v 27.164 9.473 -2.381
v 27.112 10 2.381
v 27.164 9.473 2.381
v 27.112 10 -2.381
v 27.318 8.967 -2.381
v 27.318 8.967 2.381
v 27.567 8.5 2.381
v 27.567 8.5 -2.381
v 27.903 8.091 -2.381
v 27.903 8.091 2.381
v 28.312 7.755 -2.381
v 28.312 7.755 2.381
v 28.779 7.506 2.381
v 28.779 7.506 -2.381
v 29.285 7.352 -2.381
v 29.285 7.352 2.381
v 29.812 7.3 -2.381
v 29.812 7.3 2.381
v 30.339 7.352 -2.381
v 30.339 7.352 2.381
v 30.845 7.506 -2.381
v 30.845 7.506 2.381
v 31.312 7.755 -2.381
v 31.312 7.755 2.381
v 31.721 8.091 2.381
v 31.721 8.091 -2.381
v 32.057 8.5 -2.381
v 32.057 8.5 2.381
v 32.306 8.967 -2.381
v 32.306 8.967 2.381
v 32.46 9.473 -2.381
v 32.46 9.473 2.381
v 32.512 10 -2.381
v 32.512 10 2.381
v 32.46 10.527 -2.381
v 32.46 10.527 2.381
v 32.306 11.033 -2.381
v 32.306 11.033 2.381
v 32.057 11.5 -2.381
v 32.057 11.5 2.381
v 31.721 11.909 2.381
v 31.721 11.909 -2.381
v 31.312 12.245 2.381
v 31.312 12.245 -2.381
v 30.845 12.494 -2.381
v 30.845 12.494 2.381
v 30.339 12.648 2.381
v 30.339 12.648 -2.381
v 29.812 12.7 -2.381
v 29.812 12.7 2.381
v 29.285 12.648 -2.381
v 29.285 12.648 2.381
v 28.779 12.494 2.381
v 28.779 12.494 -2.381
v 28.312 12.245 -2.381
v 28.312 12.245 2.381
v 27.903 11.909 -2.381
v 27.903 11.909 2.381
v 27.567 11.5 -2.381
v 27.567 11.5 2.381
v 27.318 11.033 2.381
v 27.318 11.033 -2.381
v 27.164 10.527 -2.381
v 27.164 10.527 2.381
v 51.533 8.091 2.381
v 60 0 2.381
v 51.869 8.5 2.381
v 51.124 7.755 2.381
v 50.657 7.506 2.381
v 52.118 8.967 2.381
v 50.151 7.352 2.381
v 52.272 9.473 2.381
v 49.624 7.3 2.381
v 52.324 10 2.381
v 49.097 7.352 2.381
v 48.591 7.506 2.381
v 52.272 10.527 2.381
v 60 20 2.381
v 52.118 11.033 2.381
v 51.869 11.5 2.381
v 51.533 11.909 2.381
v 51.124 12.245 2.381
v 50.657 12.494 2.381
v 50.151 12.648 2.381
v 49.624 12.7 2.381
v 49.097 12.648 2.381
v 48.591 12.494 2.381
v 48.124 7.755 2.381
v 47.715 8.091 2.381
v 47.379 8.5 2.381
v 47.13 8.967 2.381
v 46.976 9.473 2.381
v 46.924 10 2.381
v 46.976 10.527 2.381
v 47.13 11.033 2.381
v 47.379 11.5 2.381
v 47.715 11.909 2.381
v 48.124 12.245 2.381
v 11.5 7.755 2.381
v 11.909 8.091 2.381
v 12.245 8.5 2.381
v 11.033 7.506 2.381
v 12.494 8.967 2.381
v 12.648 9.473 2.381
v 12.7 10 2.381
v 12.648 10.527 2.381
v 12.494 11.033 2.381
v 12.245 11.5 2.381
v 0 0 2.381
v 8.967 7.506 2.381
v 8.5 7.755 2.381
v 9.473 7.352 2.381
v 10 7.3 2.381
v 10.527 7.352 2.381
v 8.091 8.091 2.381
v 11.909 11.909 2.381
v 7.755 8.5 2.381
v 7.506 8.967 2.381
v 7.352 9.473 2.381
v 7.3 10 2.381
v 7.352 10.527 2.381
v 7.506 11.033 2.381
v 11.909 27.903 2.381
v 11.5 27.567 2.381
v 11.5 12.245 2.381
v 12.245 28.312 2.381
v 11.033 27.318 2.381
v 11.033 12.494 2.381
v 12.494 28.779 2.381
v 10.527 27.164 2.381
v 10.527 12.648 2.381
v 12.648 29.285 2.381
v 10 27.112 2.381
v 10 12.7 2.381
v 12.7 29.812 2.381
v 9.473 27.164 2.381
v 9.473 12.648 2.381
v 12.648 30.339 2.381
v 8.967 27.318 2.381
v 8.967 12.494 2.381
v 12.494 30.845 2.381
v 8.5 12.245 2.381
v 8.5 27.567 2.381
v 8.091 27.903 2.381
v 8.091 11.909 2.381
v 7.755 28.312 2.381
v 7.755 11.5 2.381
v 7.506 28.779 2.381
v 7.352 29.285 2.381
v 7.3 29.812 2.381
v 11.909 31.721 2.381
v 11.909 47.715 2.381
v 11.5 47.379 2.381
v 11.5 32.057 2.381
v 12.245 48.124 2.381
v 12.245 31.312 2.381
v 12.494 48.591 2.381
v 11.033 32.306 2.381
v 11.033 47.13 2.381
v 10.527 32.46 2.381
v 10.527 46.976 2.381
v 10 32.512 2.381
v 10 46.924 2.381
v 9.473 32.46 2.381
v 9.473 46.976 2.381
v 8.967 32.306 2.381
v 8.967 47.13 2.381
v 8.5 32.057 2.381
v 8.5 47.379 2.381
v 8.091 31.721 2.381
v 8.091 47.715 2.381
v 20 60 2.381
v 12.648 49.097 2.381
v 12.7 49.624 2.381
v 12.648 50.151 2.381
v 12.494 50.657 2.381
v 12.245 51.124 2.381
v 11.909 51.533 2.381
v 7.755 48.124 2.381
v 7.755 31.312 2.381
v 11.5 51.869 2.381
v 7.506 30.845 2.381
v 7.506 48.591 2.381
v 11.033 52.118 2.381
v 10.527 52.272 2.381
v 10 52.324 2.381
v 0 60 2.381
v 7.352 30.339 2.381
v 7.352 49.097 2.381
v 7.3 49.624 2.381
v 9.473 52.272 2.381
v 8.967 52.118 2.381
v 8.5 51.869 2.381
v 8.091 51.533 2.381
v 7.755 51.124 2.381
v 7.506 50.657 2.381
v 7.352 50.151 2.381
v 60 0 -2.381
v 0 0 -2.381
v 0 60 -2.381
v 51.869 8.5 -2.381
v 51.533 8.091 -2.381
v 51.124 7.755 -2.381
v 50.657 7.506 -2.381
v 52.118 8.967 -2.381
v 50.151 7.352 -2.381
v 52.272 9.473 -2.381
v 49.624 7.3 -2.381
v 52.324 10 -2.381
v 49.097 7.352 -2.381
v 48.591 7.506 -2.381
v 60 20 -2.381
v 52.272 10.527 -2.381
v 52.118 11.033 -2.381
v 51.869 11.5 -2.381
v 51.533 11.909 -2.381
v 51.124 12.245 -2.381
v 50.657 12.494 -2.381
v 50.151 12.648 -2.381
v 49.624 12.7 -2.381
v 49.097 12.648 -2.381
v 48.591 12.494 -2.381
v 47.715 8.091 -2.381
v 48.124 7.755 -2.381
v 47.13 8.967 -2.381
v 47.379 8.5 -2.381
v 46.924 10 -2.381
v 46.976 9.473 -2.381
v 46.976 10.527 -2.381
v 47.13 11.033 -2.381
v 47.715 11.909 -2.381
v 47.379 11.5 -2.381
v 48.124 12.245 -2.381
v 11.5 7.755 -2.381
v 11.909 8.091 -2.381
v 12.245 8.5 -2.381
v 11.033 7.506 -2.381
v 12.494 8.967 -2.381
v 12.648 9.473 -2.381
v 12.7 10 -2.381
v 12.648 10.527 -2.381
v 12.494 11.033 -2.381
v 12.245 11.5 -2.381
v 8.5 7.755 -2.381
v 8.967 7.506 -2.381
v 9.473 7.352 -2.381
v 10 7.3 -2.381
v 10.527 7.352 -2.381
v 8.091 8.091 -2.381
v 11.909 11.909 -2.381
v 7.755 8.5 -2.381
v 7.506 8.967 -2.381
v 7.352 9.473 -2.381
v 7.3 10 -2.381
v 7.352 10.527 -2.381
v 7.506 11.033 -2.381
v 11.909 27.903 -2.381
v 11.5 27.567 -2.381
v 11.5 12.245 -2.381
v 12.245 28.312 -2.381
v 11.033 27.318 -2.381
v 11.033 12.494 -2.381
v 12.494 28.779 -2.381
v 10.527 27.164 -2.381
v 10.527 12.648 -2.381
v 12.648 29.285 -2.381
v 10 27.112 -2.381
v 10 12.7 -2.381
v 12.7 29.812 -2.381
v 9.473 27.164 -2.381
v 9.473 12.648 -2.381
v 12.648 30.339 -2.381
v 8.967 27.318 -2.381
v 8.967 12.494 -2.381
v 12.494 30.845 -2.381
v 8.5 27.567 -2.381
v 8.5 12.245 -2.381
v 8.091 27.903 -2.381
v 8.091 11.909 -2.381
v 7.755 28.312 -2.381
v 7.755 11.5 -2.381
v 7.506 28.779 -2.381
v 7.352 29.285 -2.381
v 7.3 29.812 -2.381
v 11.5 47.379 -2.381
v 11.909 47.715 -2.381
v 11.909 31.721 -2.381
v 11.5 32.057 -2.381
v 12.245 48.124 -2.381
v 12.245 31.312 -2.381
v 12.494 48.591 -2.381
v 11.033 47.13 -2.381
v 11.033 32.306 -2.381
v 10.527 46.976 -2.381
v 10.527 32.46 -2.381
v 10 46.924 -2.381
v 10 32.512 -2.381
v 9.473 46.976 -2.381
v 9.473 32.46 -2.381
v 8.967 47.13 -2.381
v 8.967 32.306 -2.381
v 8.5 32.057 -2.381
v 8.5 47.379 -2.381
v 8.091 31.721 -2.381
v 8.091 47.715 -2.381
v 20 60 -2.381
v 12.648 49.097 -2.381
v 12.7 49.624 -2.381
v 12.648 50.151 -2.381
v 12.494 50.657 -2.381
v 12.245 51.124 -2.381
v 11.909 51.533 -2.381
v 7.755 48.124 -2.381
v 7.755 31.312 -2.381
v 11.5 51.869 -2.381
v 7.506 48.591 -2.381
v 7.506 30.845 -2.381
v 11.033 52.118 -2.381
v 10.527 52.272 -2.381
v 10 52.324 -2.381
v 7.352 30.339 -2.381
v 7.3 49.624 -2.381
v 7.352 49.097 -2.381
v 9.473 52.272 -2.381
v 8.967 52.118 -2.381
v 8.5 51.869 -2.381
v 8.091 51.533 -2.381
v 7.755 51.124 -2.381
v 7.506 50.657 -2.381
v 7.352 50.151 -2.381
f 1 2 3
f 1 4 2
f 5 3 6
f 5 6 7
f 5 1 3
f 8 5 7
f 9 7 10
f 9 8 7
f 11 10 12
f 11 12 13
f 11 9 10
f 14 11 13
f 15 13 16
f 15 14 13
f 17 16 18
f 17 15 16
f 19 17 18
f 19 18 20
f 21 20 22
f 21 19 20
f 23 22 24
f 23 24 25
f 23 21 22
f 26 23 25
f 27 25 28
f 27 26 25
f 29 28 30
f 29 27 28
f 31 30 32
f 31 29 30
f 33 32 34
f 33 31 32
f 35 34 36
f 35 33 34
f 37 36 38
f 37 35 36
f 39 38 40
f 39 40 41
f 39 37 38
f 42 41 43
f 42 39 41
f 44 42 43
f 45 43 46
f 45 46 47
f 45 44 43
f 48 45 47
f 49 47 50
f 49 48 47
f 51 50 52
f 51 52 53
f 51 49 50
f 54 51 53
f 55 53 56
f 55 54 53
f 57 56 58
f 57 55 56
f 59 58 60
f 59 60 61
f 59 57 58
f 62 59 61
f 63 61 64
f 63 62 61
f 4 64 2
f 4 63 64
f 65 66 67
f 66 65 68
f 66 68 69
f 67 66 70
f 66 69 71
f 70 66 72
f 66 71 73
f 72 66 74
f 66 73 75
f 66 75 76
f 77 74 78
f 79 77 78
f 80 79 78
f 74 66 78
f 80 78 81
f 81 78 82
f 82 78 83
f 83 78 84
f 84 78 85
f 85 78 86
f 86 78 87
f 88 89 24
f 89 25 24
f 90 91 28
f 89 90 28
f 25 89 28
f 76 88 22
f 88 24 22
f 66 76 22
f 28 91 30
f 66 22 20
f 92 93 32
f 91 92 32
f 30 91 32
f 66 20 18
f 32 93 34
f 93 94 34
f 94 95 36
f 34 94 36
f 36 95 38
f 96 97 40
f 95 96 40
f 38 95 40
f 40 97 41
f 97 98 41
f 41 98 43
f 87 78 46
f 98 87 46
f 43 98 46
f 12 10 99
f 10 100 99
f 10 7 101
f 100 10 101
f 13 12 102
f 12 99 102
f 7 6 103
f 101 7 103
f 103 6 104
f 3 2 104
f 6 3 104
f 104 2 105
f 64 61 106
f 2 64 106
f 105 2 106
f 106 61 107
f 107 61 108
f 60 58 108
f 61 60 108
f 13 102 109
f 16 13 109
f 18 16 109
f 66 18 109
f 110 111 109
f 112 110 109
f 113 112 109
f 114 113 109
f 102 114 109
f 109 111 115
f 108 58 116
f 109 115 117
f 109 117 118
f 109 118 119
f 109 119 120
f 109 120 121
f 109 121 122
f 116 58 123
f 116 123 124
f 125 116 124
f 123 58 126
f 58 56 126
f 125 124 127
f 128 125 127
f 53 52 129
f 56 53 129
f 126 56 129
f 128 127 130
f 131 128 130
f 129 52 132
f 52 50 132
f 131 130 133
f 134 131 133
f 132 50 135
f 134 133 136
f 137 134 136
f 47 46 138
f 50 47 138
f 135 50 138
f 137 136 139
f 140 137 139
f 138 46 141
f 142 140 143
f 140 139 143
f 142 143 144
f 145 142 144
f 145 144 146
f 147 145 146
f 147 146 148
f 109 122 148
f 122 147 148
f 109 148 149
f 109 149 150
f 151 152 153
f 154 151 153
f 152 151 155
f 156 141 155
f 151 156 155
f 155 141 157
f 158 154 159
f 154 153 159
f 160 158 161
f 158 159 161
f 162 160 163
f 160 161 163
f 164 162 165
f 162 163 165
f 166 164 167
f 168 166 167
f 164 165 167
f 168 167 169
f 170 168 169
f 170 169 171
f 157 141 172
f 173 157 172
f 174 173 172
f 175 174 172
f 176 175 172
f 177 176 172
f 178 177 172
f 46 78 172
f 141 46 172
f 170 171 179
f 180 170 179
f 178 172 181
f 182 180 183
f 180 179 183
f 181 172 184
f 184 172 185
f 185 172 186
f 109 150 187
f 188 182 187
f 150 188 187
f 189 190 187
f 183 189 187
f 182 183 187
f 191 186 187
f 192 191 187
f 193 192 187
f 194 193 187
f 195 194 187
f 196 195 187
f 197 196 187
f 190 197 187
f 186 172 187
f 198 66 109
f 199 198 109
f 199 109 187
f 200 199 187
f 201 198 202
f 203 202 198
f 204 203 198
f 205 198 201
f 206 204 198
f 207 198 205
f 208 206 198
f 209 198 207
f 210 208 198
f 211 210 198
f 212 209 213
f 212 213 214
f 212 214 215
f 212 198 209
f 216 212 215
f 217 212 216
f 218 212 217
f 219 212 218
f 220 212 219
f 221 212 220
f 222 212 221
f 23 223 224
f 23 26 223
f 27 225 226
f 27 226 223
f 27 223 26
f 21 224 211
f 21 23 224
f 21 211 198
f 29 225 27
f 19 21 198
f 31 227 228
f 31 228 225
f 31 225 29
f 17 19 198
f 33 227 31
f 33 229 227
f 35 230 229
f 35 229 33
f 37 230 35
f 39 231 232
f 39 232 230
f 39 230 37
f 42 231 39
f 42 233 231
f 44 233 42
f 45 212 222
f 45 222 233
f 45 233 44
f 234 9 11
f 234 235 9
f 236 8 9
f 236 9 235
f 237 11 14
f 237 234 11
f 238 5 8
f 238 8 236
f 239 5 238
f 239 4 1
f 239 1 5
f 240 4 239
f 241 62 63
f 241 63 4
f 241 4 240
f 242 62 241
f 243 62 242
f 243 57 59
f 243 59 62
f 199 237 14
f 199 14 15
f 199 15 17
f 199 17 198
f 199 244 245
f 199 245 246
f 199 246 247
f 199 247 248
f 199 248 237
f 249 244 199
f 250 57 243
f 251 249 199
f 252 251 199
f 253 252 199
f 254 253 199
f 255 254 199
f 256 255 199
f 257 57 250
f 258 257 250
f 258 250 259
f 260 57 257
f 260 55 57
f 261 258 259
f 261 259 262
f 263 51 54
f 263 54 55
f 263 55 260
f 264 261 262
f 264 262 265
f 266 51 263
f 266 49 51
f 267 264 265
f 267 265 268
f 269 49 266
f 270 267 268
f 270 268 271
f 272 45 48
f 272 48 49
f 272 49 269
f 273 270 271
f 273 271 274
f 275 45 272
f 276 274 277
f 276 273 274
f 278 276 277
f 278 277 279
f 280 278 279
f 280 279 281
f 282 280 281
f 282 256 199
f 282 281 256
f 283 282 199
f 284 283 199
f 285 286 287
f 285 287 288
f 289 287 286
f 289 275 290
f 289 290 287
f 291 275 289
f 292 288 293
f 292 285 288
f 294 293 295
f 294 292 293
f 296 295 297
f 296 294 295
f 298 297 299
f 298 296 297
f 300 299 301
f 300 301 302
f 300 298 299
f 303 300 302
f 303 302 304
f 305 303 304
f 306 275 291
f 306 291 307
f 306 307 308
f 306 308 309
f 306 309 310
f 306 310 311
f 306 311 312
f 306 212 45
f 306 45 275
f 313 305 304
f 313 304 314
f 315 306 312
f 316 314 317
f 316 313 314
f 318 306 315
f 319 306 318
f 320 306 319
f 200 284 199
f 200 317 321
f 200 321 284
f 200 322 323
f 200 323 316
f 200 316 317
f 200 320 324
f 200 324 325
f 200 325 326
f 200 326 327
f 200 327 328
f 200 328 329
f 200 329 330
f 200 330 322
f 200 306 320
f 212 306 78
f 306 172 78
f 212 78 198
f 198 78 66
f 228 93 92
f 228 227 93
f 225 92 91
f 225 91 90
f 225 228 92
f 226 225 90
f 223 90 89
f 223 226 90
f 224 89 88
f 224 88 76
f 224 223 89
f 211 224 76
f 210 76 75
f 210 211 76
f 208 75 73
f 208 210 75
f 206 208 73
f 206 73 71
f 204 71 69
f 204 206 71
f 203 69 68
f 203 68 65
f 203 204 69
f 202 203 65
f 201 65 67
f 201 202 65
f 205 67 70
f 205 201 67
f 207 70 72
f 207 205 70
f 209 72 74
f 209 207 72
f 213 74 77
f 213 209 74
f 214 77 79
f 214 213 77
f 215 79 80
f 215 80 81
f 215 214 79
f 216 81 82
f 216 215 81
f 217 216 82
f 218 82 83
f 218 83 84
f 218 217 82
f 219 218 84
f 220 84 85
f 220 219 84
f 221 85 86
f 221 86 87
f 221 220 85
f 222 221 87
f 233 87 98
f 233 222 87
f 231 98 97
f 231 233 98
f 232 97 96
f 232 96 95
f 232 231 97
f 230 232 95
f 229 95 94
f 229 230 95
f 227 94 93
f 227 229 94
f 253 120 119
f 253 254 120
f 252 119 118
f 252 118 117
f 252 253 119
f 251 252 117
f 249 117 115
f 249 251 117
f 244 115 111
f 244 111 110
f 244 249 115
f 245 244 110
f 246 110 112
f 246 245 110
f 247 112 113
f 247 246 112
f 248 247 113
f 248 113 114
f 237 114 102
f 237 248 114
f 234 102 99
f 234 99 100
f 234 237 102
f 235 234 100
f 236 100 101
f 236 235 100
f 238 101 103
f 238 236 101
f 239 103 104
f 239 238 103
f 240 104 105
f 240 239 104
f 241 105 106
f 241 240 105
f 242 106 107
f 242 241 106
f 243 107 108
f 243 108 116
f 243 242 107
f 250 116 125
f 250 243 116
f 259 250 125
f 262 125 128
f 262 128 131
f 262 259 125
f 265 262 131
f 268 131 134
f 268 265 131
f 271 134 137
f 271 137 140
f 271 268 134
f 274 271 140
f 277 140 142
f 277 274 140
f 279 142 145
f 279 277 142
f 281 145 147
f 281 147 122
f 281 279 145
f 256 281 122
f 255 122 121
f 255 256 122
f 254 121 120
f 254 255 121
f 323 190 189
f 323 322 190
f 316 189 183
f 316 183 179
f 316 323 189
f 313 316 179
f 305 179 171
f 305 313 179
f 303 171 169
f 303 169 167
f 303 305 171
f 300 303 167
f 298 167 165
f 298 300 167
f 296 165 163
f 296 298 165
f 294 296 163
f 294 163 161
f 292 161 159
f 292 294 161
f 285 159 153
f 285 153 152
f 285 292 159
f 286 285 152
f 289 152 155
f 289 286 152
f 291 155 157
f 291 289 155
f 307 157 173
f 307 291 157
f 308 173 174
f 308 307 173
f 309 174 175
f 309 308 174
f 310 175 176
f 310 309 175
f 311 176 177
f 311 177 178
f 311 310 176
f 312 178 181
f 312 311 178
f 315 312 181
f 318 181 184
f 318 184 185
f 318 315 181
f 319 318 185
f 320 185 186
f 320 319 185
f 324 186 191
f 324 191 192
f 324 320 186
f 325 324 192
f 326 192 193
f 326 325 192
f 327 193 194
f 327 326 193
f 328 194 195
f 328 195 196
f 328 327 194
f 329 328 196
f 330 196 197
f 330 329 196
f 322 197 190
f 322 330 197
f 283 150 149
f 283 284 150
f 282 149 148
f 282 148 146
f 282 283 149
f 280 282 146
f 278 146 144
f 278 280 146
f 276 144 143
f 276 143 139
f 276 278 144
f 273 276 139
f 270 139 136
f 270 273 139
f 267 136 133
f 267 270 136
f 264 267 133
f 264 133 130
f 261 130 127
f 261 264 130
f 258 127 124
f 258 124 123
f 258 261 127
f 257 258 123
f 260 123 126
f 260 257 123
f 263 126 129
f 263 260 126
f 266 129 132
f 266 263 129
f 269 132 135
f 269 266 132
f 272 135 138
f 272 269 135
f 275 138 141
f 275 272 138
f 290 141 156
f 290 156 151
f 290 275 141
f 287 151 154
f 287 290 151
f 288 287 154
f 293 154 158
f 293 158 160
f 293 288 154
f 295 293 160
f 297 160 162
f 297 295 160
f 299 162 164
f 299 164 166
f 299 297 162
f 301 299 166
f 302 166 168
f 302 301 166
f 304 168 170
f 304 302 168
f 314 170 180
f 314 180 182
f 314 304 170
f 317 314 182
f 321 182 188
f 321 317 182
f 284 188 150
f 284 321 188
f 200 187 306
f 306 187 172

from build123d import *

# Parameters (mm, degrees)
SKETCH1_R           = 2.7
BOSS_EXTRUDE1_DEPTH = 2.38125


with BuildPart() as part:
    # Sketch1 → Boss-Extrude1 (new, symmetric)
    with BuildSketch(Plane.XY):
        Polygon((0, 0), (0, 60), (20, 60), (60, 20), (60, 0), align=None)
        with Locations(Location((10, 10, 0), (0, 0, 180))):
            Circle(SKETCH1_R, mode=Mode.SUBTRACT)
        with Locations(Location((29.812, 10, 0), (0, 0, 180))):
            Circle(SKETCH1_R, mode=Mode.SUBTRACT)
        with Locations(Location((49.624, 10, 0), (0, 0, 180))):
            Circle(SKETCH1_R, mode=Mode.SUBTRACT)
        with Locations(Location((10, 29.812, 0), (0, 0, 180))):
            Circle(SKETCH1_R, mode=Mode.SUBTRACT)
        with Locations(Location((10, 49.624, 0), (0, 0, 180))):
            Circle(SKETCH1_R, mode=Mode.SUBTRACT)
    extrude(amount=BOSS_EXTRUDE1_DEPTH, both=True)


solid = part.part
